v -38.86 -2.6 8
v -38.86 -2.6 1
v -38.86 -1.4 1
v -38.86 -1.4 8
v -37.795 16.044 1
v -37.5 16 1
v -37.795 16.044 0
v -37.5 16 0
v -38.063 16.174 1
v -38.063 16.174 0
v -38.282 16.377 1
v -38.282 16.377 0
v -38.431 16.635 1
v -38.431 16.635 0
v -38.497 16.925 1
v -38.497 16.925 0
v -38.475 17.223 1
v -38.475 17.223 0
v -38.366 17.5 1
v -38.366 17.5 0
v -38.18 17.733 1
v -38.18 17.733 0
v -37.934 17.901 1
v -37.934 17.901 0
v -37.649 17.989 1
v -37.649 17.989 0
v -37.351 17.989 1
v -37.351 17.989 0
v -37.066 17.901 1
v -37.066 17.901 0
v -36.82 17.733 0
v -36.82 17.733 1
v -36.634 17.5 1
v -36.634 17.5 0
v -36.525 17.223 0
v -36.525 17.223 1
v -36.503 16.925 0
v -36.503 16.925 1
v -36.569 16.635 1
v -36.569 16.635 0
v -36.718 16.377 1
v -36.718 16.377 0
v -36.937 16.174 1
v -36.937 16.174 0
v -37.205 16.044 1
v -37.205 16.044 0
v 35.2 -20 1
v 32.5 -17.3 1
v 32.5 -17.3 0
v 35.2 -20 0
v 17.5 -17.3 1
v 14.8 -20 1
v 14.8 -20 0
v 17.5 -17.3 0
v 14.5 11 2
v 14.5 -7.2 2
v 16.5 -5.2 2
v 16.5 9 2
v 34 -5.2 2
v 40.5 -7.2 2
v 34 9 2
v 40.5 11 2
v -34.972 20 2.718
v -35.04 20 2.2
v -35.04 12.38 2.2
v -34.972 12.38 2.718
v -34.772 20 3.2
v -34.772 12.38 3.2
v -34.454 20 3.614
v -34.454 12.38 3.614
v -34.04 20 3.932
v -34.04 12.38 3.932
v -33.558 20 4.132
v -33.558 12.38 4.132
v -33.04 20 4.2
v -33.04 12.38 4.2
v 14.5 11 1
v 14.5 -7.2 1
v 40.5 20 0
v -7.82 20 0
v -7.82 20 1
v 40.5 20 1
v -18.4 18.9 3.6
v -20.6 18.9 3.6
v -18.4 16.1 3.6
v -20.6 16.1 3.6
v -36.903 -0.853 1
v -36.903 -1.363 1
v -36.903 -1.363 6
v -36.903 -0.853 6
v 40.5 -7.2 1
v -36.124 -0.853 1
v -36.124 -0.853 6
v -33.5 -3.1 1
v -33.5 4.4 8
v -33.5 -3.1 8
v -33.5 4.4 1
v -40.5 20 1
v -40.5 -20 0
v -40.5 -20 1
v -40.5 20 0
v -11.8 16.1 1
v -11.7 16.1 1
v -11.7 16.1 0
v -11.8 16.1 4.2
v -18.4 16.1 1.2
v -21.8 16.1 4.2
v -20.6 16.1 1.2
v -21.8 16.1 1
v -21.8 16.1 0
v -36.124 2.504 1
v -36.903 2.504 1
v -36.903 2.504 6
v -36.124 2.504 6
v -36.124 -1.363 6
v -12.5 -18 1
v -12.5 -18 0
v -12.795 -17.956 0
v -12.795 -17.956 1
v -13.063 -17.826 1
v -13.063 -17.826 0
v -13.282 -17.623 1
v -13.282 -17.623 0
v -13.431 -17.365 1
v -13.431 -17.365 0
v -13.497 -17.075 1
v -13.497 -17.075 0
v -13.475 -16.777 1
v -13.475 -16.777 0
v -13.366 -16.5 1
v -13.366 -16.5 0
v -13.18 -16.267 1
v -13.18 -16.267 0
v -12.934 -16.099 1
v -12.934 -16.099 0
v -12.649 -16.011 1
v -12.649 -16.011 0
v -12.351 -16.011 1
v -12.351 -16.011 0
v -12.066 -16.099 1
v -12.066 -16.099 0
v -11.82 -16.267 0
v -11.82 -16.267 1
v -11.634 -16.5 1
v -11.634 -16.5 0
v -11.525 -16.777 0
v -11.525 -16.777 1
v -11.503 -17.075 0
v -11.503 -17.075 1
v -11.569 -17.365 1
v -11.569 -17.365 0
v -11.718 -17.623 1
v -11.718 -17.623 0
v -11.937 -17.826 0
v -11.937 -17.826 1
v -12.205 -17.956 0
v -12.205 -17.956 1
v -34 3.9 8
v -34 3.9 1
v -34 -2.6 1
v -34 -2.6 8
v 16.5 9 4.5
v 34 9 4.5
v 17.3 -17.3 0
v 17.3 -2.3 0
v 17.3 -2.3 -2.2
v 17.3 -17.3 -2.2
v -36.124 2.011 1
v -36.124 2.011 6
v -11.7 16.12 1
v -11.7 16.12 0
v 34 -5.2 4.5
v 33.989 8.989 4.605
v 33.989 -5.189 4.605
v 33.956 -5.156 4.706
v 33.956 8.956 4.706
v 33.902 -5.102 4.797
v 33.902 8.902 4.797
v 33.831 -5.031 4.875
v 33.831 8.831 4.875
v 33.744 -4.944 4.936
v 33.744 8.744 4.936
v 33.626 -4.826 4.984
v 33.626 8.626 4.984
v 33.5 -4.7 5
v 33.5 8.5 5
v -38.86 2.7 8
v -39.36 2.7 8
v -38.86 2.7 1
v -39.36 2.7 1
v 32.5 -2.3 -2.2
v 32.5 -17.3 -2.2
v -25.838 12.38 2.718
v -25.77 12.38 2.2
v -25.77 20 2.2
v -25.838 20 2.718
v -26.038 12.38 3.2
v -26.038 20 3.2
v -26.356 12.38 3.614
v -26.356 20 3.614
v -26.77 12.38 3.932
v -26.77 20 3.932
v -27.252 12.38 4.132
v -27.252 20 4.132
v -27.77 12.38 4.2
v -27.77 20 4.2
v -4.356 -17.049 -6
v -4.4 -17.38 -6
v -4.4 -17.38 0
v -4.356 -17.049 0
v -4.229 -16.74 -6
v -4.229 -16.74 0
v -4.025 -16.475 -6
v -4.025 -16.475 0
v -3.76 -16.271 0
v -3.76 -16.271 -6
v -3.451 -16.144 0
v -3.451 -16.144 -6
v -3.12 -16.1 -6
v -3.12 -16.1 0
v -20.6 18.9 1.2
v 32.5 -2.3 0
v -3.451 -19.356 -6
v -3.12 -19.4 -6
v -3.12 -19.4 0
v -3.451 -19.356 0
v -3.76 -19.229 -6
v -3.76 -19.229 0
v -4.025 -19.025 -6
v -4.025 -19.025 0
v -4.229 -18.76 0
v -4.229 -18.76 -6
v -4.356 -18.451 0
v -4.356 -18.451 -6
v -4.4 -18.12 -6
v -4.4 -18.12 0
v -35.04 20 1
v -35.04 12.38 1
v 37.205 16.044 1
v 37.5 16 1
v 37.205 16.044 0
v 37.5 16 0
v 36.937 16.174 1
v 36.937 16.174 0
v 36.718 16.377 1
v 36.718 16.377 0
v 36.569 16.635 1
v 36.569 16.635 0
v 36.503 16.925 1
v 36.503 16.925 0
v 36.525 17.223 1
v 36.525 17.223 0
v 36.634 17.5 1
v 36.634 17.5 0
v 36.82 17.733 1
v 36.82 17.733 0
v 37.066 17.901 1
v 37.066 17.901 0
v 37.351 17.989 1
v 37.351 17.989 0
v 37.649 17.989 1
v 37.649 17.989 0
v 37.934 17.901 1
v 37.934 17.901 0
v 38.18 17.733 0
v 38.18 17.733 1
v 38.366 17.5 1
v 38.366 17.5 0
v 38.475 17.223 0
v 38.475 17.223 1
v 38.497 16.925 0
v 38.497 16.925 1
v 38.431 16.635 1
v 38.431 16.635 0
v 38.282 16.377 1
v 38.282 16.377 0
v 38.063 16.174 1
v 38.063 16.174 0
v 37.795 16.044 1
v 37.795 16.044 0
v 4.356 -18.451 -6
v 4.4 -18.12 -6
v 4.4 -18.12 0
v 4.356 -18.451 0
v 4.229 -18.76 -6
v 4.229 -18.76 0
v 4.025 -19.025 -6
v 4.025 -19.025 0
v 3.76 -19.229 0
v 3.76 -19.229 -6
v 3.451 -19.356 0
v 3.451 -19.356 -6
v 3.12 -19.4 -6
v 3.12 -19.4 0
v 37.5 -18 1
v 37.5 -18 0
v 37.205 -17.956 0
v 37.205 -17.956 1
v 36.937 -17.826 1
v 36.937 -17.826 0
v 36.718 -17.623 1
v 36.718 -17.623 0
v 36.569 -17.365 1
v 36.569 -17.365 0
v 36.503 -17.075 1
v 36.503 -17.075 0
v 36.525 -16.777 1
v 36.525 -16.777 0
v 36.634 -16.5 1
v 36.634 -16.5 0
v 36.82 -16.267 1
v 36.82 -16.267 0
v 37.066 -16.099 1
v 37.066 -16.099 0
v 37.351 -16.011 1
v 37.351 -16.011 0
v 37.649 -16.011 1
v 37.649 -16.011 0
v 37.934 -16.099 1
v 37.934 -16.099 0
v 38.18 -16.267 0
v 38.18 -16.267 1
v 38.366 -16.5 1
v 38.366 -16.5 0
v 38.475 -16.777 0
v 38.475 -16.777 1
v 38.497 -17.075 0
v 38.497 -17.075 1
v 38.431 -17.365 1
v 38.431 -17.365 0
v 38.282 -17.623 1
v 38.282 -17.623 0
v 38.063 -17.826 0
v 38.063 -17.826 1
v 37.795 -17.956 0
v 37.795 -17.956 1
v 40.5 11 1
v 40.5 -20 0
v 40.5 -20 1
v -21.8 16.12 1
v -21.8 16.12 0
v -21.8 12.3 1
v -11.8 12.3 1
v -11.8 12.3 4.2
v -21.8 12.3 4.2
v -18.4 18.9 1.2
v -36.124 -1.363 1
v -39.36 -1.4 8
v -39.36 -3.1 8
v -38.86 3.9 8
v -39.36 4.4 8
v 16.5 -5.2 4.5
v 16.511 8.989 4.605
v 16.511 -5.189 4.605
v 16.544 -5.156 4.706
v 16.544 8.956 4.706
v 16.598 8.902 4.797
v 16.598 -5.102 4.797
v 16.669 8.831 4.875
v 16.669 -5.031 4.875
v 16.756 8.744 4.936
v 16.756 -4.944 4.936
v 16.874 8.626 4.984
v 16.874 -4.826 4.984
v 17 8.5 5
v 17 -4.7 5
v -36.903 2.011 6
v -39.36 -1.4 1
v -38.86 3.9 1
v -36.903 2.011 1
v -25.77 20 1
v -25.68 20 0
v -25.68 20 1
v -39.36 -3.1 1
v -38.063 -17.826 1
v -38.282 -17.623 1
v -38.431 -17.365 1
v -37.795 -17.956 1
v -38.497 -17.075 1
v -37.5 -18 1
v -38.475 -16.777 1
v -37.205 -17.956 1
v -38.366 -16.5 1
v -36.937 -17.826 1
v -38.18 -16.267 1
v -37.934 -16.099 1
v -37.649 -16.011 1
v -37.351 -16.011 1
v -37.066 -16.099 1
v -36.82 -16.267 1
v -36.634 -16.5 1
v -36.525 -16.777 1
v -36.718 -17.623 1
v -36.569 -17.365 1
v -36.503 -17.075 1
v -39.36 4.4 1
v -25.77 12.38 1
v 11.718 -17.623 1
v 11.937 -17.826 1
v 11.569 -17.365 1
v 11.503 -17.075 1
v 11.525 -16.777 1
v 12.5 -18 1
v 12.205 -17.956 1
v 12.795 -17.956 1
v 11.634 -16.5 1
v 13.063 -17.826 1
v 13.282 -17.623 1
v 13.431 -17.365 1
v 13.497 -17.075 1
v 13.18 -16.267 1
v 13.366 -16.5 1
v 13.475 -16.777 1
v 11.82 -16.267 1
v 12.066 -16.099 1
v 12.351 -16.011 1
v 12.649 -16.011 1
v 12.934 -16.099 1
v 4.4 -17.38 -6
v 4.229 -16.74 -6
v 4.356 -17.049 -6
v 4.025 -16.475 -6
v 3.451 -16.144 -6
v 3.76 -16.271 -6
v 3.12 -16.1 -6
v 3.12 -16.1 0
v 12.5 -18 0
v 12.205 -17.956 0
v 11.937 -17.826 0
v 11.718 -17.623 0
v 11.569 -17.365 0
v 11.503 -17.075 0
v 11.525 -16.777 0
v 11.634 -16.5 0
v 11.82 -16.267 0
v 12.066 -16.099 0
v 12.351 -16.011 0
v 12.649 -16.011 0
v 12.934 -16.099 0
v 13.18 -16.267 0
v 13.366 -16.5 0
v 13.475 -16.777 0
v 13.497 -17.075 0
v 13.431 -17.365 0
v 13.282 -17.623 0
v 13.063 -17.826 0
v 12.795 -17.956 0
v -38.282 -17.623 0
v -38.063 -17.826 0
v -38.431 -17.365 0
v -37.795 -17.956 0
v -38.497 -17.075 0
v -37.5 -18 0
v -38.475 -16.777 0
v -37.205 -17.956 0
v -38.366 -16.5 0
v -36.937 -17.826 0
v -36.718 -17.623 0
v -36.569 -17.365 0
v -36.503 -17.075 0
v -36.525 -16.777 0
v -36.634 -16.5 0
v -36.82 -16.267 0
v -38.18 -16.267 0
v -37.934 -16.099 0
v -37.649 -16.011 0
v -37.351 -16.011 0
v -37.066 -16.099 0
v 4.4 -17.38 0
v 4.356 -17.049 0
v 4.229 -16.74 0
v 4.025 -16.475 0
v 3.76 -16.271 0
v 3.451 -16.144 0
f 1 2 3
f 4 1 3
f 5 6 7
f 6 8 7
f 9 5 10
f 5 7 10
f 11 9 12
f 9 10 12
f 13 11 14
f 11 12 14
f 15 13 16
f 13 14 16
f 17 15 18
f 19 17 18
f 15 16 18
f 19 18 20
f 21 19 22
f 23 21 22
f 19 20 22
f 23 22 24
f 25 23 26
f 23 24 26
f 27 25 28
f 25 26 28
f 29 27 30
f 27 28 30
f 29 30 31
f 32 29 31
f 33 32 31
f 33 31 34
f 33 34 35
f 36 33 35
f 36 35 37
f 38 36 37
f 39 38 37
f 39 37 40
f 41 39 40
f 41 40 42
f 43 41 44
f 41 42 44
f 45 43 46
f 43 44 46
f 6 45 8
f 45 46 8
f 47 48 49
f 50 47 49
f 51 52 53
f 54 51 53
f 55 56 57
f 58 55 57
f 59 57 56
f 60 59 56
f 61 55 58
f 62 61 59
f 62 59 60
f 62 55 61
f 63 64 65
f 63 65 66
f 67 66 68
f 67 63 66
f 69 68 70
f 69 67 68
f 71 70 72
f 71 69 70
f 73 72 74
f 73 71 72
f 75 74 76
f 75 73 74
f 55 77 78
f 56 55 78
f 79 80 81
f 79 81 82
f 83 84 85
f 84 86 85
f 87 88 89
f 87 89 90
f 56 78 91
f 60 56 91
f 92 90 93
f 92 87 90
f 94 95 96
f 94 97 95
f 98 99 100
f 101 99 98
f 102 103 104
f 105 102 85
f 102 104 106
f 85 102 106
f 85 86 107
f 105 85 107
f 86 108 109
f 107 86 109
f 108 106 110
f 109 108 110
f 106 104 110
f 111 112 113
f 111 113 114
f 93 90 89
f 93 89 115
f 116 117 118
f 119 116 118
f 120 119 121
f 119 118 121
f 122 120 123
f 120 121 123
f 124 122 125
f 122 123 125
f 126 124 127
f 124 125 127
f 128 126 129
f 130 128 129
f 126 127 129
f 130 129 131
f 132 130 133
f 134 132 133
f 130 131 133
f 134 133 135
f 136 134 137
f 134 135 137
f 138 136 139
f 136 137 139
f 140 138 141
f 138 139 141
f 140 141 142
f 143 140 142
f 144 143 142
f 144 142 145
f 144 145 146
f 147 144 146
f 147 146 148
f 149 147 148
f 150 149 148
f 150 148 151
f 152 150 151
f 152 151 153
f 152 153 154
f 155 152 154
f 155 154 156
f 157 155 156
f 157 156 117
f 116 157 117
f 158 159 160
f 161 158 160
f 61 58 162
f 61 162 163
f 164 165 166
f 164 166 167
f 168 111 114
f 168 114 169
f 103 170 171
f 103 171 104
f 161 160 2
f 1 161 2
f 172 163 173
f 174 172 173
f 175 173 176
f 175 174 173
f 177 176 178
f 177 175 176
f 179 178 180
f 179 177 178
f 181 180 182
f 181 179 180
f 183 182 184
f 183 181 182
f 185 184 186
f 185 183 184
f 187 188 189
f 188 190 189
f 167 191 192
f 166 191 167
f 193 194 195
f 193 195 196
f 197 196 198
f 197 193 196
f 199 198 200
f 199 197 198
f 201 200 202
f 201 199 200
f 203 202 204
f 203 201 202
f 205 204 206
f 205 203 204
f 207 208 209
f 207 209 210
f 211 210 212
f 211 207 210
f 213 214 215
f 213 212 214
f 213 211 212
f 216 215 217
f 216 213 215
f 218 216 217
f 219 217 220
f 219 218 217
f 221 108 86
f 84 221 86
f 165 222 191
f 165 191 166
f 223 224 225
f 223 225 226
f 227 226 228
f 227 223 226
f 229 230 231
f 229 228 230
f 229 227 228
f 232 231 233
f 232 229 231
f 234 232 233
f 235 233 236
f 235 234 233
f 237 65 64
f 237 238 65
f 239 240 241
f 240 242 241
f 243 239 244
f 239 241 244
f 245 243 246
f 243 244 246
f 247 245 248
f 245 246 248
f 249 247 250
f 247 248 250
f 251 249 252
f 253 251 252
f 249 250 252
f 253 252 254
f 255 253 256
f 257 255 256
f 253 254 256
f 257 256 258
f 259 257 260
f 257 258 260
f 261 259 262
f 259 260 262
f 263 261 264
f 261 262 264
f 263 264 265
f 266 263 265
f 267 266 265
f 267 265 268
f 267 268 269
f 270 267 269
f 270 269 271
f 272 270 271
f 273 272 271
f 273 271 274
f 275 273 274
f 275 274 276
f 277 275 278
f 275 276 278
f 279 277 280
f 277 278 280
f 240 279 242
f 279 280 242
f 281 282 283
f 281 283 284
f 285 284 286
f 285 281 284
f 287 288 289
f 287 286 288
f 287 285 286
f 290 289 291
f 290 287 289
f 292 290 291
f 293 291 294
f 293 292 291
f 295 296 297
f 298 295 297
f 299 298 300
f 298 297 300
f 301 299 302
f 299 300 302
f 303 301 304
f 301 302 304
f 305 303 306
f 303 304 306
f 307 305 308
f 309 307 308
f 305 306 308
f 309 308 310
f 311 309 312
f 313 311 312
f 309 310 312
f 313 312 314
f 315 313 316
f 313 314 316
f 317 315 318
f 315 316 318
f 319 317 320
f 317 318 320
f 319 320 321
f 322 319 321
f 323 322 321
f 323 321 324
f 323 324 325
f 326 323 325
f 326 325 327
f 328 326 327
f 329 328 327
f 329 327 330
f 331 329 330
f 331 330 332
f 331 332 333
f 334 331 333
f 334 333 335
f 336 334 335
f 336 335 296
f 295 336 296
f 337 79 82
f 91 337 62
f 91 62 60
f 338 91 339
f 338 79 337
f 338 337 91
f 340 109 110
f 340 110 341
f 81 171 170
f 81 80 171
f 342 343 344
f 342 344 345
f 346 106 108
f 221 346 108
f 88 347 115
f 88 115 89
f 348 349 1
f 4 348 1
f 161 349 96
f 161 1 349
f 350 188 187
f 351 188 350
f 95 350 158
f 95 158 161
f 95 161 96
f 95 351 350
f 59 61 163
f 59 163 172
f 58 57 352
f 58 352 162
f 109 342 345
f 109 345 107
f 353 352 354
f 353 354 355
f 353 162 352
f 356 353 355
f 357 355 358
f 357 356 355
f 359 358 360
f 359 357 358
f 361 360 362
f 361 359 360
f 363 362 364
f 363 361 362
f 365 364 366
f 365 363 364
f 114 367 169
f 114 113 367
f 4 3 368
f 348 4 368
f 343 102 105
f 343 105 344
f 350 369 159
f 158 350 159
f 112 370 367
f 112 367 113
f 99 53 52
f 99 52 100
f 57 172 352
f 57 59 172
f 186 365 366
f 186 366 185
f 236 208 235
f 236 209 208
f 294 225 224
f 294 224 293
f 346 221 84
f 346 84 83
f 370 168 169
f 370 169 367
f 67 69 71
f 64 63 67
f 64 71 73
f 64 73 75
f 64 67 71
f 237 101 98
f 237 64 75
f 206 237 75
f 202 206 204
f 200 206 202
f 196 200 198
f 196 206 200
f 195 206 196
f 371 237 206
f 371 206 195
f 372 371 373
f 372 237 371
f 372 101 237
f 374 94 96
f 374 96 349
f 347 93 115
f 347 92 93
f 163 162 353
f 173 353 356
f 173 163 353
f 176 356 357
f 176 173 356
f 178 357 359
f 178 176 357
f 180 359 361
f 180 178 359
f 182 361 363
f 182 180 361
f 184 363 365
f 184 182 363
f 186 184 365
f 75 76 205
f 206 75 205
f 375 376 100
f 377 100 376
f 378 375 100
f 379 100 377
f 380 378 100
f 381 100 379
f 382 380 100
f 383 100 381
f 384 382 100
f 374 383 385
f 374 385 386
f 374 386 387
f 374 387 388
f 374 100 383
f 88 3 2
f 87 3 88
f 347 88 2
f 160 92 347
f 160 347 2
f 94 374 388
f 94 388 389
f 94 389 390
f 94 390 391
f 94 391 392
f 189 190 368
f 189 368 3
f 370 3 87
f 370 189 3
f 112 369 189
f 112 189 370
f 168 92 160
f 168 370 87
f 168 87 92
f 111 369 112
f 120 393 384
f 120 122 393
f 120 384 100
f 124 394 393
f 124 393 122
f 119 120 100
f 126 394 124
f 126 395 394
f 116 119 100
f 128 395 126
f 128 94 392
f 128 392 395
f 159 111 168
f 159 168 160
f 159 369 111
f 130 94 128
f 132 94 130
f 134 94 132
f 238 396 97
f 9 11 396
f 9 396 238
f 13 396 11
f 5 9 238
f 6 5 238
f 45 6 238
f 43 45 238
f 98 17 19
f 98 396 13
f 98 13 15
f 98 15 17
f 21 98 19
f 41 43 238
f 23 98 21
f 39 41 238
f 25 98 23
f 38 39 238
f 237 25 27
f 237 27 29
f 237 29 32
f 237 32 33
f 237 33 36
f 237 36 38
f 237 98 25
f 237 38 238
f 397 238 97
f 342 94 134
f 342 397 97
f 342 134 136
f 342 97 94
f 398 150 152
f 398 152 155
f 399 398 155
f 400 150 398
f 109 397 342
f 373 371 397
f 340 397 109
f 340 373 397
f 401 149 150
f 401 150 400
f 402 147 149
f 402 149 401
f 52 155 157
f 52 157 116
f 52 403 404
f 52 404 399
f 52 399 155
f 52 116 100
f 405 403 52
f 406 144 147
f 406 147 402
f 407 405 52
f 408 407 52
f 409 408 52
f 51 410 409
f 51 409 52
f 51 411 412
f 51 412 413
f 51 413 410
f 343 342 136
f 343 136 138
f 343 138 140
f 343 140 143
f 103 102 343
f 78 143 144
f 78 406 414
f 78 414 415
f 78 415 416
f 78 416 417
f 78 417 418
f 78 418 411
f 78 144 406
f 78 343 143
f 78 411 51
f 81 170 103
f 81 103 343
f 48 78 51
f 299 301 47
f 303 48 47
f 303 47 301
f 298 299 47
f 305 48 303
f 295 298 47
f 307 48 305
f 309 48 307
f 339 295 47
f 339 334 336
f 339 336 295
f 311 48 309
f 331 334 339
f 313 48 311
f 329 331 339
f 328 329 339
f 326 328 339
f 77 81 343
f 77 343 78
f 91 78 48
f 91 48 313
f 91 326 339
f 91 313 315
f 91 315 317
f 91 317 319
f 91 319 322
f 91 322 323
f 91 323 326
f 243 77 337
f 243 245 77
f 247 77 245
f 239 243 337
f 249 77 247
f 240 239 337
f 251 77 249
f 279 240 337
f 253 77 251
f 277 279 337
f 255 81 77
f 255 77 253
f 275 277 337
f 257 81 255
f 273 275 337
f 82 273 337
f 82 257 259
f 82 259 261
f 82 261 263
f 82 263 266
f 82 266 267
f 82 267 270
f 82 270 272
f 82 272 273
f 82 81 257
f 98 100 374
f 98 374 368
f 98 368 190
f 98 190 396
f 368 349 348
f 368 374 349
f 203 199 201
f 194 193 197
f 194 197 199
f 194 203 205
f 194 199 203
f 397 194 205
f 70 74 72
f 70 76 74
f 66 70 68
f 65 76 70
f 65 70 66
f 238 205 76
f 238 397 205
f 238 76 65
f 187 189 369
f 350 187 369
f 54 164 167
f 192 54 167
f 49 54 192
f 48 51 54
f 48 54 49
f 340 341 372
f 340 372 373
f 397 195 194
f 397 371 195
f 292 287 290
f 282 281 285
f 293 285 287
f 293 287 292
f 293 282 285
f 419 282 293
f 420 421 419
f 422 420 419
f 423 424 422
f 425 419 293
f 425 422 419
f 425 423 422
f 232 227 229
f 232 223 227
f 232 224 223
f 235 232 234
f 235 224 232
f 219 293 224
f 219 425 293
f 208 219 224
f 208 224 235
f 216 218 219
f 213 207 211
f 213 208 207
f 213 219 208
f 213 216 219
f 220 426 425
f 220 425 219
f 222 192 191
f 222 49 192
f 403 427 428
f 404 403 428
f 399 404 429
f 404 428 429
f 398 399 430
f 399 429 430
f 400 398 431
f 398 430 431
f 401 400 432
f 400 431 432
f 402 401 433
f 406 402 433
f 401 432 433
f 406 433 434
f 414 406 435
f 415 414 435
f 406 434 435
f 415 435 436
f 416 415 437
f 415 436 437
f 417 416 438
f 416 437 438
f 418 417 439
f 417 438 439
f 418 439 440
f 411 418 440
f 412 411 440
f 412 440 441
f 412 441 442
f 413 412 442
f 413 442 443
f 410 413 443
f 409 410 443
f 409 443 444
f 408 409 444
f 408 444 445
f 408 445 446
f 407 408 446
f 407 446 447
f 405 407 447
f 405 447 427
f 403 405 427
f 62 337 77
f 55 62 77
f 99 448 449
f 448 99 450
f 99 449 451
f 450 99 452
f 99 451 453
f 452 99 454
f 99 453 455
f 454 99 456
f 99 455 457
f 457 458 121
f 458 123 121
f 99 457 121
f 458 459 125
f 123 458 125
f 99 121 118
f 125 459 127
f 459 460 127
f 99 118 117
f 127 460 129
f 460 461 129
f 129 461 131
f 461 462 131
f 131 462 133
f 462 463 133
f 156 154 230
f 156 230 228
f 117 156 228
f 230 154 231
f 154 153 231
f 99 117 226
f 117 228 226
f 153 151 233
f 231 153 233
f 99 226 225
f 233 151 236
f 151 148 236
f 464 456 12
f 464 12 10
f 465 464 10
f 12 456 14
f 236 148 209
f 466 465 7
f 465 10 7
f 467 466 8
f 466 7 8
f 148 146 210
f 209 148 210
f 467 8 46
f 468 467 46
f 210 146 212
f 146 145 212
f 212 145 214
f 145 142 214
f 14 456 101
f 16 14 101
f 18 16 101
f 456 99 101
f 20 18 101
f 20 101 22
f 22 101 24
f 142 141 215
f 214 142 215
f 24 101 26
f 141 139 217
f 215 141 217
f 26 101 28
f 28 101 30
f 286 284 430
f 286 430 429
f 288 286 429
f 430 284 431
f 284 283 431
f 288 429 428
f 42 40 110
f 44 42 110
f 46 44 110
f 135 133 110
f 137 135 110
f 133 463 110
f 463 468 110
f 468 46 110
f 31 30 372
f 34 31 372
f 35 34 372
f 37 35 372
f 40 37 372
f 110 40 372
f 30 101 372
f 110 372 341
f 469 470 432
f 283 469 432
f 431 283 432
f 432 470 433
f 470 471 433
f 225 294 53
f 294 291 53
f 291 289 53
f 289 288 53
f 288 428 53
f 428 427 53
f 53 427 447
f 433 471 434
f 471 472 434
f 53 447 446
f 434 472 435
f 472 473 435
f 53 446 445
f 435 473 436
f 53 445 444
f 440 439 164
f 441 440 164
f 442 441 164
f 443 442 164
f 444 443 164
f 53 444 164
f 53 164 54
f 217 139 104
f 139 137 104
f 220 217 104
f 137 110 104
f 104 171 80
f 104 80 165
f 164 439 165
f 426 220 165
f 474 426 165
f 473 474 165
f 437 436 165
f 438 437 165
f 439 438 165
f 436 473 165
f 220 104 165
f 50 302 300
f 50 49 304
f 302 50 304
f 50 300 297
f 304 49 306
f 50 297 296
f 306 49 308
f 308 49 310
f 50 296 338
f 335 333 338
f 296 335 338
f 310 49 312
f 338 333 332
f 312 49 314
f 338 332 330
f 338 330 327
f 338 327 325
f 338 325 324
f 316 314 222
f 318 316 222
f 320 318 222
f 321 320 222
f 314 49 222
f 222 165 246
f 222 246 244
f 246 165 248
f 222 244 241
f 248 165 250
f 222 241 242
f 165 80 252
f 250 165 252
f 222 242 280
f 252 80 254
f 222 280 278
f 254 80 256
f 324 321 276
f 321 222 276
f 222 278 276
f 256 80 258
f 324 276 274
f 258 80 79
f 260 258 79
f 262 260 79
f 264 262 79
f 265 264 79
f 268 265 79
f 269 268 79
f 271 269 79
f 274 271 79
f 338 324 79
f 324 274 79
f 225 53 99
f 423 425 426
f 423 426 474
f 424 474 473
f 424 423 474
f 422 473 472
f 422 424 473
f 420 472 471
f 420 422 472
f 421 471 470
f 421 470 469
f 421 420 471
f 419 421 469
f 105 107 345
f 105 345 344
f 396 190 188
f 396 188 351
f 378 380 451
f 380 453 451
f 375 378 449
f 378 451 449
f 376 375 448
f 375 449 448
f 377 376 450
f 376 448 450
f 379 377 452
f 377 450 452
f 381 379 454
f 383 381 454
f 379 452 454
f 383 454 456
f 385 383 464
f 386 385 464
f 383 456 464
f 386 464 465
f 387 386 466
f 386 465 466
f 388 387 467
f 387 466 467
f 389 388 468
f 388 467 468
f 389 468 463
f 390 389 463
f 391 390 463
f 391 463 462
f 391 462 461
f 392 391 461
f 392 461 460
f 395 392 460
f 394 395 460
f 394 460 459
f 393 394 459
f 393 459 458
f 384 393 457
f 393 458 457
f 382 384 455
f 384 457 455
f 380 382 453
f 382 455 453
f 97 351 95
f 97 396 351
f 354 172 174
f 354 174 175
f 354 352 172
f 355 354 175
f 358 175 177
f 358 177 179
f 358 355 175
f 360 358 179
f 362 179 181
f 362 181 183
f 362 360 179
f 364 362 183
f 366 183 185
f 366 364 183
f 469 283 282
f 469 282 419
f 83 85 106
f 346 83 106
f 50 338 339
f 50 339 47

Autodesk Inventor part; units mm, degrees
ref_plane "YZ Plane" through (0, 0, 0) normal (1, 0, 0) x (0, 1, 0)
ref_plane "XZ Plane" through (0, 0, 0) normal (0, 1, 0) x (-1, 0, 0)
ref_plane "XY Plane" through (0, 0, 0) normal (0, 0, 1) x (1, 0, 0)
sketch "Sketch1" plane through (0, 0, 0) normal (0, 0, 1) x (1, 0, 0)
  line L0 (-40.5, 20) -> (40.5, 20)
  line L1 (40.5, 20) -> (40.5, -20)
  line L2 (40.5, -20) -> (-40.5, -20)
  line L3 (-40.5, -20) -> (-40.5, 20)
  point P0 (0, 0)
  dimension "d0" = 81
  dimension "d1" = 40
  dimension "d2" = 20
  dimension "d3" = 40.5
extrude "Extrusion1" add sketch "Sketch1" along normal blind 1
sketch "Sketch2" plane through (0, 0, 1) normal (0, 0, 1) x (1, 0, 0)
  line L0 (40.5, 20) -> (-40.5, 20) projected
  line L1 (-21.8, 20) -> (-11.7, 20)
  line L2 (-11.7, 20) -> (-11.7, 16.1)
  line L3 (-11.7, 16.1) -> (-21.8, 16.1)
  line L4 (-21.8, 16.1) -> (-21.8, 20)
  line L5 (-40.5, 20) -> (-40.5, -20) projected
  point P0 (0, 0)
  dimension "d6" = 18.7
  dimension "d7" = 28.8
  dimension "d8" = 3.9
extrude "Extrusion2" cut sketch "Sketch2" against normal blind 1
chamfer "Chamfer1" distance 3.88 angle 45 2 edges at (-21.8, 20, 0.5) (-11.7, 20, 0.5)
sketch "Sketch3" plane through (0, 0, 1) normal (0, 0, 1) x (1, 0, 0)
  line L0 (-25.68, 20) -> (-40.5, 20) projected
  line L1 (-35.04, 20) -> (-25.77, 20)
  line L2 (-25.77, 20) -> (-25.77, 12.38)
  line L3 (-25.77, 12.38) -> (-35.04, 12.38)
  line L4 (-35.04, 12.38) -> (-35.04, 20)
  line L5 (-40.5, 20) -> (-40.5, -20) projected
  point P0 (0, 0)
  dimension "d14" = 5.46
  dimension "d15" = 14.73
  dimension "d16" = 7.62
extrude "Extrusion3" add sketch "Sketch3" along normal blind 3.2
fillet "Fillet1" radius 2 2 edges at (-35.04, 16.19, 4.2) (-25.77, 16.19, 4.2)
sketch "Sketch4" plane through (0, 0, 1) normal (0, 0, 1) x (1, 0, 0)
  line L0 (-11.7, 16.1) -> (-21.8, 16.1) projected
  line L1 (-21.8, 16.1) -> (-11.8, 16.1)
  line L2 (-11.8, 16.1) -> (-11.8, 12.3)
  line L3 (-11.8, 12.3) -> (-21.8, 12.3)
  line L4 (-21.8, 12.3) -> (-21.8, 16.1)
  point P0 (0, 0)
  dimension "d20" = 3.8
  dimension "d21" = 10
extrude "Extrusion4" add sketch "Sketch4" along normal blind 3.2
sketch "Sketch5" plane through (-21.8, 16.1, 0) normal (0, 1, 0) x (1, 0, 0)
  line L0 (1.2, -3.6) -> (3.4, -3.6)
  line L1 (3.4, -3.6) -> (3.4, -1.2)
  line L2 (3.4, -1.2) -> (1.2, -1.2)
  line L3 (1.2, -1.2) -> (1.2, -3.6)
  line L4 (10, -4.2) -> (0, -4.2) projected
  line L5 (0, -1) -> (0, -4.2) projected
  point P0 (21.8, 0)
  dimension "d24" = 0.6
  dimension "d25" = 1.2
  dimension "d26" = 2.4
  dimension "d27" = 2.2
extrude "Extrusion5" add sketch "Sketch5" along normal blind 2.8
sketch "Sketch6" plane through (0, 0, 1) normal (0, 0, 1) x (1, 0, 0)
  line L0 (-40.5, 20) -> (-40.5, -20) projected
  line L1 (-40.5, -20) -> (40.5, -20) projected
  point P0 (0, 0)
  point P1 (-37.5, -17)
  point P2 (-12.5, -17)
  point P3 (12.5, -17)
  point P4 (37.5, -17)
  dimension "d30" = 3
  dimension "d31" = 28
  dimension "d32" = 53
  dimension "d33" = 78
  dimension "d34" = 3
  dimension "d35" = 3
  dimension "d36" = 3
  dimension "d37" = 3
hole "Hole1" at (-37.5, -17, 1) at (-12.5, -17, 1) at (12.5, -17, 1) at (37.5, -17, 1) direction (0, 0, -1) diameter 2 depth 4 tip angle 118
sketch "Sketch7" plane through (0, 0, 1) normal (0, 0, 1) x (1, 0, 0)
  line L0 (-40.5, 20) -> (-40.5, -20) projected
  line L1 (-40.5, -20) -> (40.5, -20) projected
  point P0 (0, 0)
  point P1 (-37.5, 17)
  point P2 (37.5, 17)
  dimension "d45" = 3
  dimension "d46" = 37
  dimension "d47" = 78
  dimension "d48" = 37
hole "Hole2" at (-37.5, 17, 1) at (37.5, 17, 1) direction (0, 0, -1) diameter 2 depth 4 tip angle 118
sketch "Sketch8" plane through (0, 0, 1) normal (0, 0, 1) x (1, 0, 0)
  line L0 (-40.5, -20) -> (40.5, -20) projected
  line L1 (17.5, -20) -> (32.5, -20)
  line L2 (32.5, -20) -> (32.5, -17.3)
  line L3 (32.5, -17.3) -> (17.5, -17.3)
  line L4 (17.5, -17.3) -> (17.5, -20)
  line L5 (-40.5, 20) -> (-40.5, -20) projected
  point P0 (0, 0)
  dimension "d56" = 58
  dimension "d57" = 73
  dimension "d58" = 2.7
extrude "Extrusion6" cut sketch "Sketch8" against normal blind 2
chamfer "Chamfer2" distance 2.7 angle 45 2 edges at (17.5, -20, 0.5) (32.5, -20, 0.5)
sketch "Sketch9" plane through (0, 0, 1) normal (0, 0, 1) x (1, 0, 0)
  line L0 (-39.36, 4.4) -> (-33.5, 4.4)
  line L1 (-33.5, 4.4) -> (-33.5, -3.1)
  line L2 (-33.5, -3.1) -> (-39.36, -3.1)
  line L3 (-39.36, -3.1) -> (-39.36, 4.4)
  line L4 (-40.5, 20) -> (-40.5, -20) projected
  line L5 (-40.5, -20) -> (14.8, -20) projected
  line L6 (-38.86, 3.9) -> (-34, 3.9)
  line L7 (-34, 3.9) -> (-34, -2.6)
  line L8 (-34, -2.6) -> (-38.86, -2.6)
  line L9 (-38.86, -2.6) -> (-38.86, 3.9)
  line L10 (-39.36, 2.7) -> (-38.86, 2.7)
  line L11 (-38.86, 2.7) -> (-38.86, -1.4)
  line L12 (-38.86, -1.4) -> (-39.36, -1.4)
  line L13 (-39.36, -1.4) -> (-39.36, 2.7)
  point P0 (0, 0)
  dimension "d64" = 1.14
  dimension "d65" = 7
  dimension "d66" = 16.9
  dimension "d67" = 24.4
  dimension "d68" = 0.5
  dimension "d69" = 0.5
  dimension "d70" = 0.5
  dimension "d71" = 0.5
  dimension "d72" = 1.2
  dimension "d73" = 1.2
extrude "Extrusion7" add sketch "Sketch9" along normal blind 7 contours L0 L1 L2 L3 L12 L9 L8 L7 L6 L10
sketch "Sketch10" plane through (0, 0, 1) normal (0, 0, 1) x (1, 0, 0)
  line L0 (-36.9032, 2.5042) -> (-36.1235, 2.5042)
  line L1 (-36.1235, 2.5042) -> (-36.1235, 2.0109)
  line L2 (-36.1235, 2.0109) -> (-36.9032, 2.0109)
  line L3 (-36.9032, 2.0109) -> (-36.9032, 2.5042)
  line L4 (-36.9032, -0.8534) -> (-36.1235, -0.8534)
  line L5 (-36.1235, -0.8534) -> (-36.1235, -1.3626)
  line L6 (-36.1235, -1.3626) -> (-36.9032, -1.3626)
  line L7 (-36.9032, -1.3626) -> (-36.9032, -0.8534)
  point P0 (0, 0)
extrude "Extrusion8" add sketch "Sketch10" along normal blind 5
sketch "Sketch11" plane through (0, 0, 1) normal (0, 0, 1) x (1, 0, 0)
  line L0 (40.5, -20) -> (40.5, 20) projected
  line L1 (40.5, 11) -> (14.5, 11)
  line L2 (14.5, 11) -> (14.5, -7.2)
  line L3 (14.5, -7.2) -> (40.5, -7.2)
  line L4 (40.5, -7.2) -> (40.5, 11)
  line L5 (-40.5, 20) -> (-40.5, -20) projected
  line L6 (40.5, 20) -> (-7.82, 20) projected
  point P0 (0, 0)
  dimension "d78" = 55
  dimension "d79" = 9
  dimension "d80" = 18.2
extrude "Extrusion9" add sketch "Sketch11" along normal blind 1
sketch "Sketch12" plane through (0, 0, 2) normal (0, 0, 1) x (1, 0, 0)
  line L0 (16.5, 9) -> (34, 9)
  line L1 (34, 9) -> (34, -5.2)
  line L2 (34, -5.2) -> (16.5, -5.2)
  line L3 (16.5, -5.2) -> (16.5, 9)
  line L4 (40.5, 11) -> (14.5, 11) projected
  line L5 (14.5, -7.2) -> (40.5, -7.2) projected
  line L6 (14.5, 11) -> (14.5, -7.2) projected
  line L7 (40.5, -7.2) -> (40.5, 11) projected
  point P0 (0, 0)
  dimension "d83" = 2
  dimension "d84" = 2
  dimension "d85" = 2
  dimension "d86" = 6.5
extrude "Extrusion10" add sketch "Sketch12" along normal blind 3 contours L0 L1 L2 L3
fillet "Fillet2" radius 0.5 4 edges at (25.25, 9, 5) (16.5, 1.9, 5) (25.25, -5.2, 5) (34, 1.9, 5)
sketch "Sketch13" plane through (0, 0, 0) normal (0, 0, -1) x (-1, 0, 0)
  line L0 (-4.4, -16.1) -> (4.4, -16.1)
  line L1 (4.4, -16.1) -> (4.4, -19.4)
  line L2 (4.4, -19.4) -> (-4.4, -19.4)
  line L3 (-4.4, -19.4) -> (-4.4, -16.1)
  line L4 (40.5, 20) -> (40.5, -20) projected
  line L5 (40.5, -20) -> (-14.8, -20) projected
  point P0 (0, 0)
  dimension "d90" = 36.1
  dimension "d91" = 44.9
  dimension "d92" = 0.6
  dimension "d93" = 3.9
extrude "Extrusion11" add sketch "Sketch13" along normal blind 6
fillet "Fillet3" radius 1.28 4 edges at (4.4, -16.1, -3) (4.4, -19.4, -3) (-4.4, -16.1, -3) (-4.4, -19.4, -3)
sketch "Sketch14" plane through (0, 0, 0) normal (0, 0, -1) x (-1, 0, 0)
  line L0 (-32.5, -2.3) -> (-17.3, -2.3)
  line L1 (-17.3, -2.3) -> (-17.3, -17.3)
  line L2 (-17.3, -17.3) -> (-32.5, -17.3)
  line L3 (-32.5, -17.3) -> (-32.5, -2.3)
  line L4 (40.5, 20) -> (40.5, -20) projected
  line L5 (-32.5, -17.3) -> (-17.5, -17.3) projected
  point P0 (0, 0)
  dimension "d97" = 57.8
  dimension "d98" = 73
  dimension "d99" = 15
extrude "Extrusion12" add sketch "Sketch14" along normal blind 2.2
properties part number "mcu-unit"
